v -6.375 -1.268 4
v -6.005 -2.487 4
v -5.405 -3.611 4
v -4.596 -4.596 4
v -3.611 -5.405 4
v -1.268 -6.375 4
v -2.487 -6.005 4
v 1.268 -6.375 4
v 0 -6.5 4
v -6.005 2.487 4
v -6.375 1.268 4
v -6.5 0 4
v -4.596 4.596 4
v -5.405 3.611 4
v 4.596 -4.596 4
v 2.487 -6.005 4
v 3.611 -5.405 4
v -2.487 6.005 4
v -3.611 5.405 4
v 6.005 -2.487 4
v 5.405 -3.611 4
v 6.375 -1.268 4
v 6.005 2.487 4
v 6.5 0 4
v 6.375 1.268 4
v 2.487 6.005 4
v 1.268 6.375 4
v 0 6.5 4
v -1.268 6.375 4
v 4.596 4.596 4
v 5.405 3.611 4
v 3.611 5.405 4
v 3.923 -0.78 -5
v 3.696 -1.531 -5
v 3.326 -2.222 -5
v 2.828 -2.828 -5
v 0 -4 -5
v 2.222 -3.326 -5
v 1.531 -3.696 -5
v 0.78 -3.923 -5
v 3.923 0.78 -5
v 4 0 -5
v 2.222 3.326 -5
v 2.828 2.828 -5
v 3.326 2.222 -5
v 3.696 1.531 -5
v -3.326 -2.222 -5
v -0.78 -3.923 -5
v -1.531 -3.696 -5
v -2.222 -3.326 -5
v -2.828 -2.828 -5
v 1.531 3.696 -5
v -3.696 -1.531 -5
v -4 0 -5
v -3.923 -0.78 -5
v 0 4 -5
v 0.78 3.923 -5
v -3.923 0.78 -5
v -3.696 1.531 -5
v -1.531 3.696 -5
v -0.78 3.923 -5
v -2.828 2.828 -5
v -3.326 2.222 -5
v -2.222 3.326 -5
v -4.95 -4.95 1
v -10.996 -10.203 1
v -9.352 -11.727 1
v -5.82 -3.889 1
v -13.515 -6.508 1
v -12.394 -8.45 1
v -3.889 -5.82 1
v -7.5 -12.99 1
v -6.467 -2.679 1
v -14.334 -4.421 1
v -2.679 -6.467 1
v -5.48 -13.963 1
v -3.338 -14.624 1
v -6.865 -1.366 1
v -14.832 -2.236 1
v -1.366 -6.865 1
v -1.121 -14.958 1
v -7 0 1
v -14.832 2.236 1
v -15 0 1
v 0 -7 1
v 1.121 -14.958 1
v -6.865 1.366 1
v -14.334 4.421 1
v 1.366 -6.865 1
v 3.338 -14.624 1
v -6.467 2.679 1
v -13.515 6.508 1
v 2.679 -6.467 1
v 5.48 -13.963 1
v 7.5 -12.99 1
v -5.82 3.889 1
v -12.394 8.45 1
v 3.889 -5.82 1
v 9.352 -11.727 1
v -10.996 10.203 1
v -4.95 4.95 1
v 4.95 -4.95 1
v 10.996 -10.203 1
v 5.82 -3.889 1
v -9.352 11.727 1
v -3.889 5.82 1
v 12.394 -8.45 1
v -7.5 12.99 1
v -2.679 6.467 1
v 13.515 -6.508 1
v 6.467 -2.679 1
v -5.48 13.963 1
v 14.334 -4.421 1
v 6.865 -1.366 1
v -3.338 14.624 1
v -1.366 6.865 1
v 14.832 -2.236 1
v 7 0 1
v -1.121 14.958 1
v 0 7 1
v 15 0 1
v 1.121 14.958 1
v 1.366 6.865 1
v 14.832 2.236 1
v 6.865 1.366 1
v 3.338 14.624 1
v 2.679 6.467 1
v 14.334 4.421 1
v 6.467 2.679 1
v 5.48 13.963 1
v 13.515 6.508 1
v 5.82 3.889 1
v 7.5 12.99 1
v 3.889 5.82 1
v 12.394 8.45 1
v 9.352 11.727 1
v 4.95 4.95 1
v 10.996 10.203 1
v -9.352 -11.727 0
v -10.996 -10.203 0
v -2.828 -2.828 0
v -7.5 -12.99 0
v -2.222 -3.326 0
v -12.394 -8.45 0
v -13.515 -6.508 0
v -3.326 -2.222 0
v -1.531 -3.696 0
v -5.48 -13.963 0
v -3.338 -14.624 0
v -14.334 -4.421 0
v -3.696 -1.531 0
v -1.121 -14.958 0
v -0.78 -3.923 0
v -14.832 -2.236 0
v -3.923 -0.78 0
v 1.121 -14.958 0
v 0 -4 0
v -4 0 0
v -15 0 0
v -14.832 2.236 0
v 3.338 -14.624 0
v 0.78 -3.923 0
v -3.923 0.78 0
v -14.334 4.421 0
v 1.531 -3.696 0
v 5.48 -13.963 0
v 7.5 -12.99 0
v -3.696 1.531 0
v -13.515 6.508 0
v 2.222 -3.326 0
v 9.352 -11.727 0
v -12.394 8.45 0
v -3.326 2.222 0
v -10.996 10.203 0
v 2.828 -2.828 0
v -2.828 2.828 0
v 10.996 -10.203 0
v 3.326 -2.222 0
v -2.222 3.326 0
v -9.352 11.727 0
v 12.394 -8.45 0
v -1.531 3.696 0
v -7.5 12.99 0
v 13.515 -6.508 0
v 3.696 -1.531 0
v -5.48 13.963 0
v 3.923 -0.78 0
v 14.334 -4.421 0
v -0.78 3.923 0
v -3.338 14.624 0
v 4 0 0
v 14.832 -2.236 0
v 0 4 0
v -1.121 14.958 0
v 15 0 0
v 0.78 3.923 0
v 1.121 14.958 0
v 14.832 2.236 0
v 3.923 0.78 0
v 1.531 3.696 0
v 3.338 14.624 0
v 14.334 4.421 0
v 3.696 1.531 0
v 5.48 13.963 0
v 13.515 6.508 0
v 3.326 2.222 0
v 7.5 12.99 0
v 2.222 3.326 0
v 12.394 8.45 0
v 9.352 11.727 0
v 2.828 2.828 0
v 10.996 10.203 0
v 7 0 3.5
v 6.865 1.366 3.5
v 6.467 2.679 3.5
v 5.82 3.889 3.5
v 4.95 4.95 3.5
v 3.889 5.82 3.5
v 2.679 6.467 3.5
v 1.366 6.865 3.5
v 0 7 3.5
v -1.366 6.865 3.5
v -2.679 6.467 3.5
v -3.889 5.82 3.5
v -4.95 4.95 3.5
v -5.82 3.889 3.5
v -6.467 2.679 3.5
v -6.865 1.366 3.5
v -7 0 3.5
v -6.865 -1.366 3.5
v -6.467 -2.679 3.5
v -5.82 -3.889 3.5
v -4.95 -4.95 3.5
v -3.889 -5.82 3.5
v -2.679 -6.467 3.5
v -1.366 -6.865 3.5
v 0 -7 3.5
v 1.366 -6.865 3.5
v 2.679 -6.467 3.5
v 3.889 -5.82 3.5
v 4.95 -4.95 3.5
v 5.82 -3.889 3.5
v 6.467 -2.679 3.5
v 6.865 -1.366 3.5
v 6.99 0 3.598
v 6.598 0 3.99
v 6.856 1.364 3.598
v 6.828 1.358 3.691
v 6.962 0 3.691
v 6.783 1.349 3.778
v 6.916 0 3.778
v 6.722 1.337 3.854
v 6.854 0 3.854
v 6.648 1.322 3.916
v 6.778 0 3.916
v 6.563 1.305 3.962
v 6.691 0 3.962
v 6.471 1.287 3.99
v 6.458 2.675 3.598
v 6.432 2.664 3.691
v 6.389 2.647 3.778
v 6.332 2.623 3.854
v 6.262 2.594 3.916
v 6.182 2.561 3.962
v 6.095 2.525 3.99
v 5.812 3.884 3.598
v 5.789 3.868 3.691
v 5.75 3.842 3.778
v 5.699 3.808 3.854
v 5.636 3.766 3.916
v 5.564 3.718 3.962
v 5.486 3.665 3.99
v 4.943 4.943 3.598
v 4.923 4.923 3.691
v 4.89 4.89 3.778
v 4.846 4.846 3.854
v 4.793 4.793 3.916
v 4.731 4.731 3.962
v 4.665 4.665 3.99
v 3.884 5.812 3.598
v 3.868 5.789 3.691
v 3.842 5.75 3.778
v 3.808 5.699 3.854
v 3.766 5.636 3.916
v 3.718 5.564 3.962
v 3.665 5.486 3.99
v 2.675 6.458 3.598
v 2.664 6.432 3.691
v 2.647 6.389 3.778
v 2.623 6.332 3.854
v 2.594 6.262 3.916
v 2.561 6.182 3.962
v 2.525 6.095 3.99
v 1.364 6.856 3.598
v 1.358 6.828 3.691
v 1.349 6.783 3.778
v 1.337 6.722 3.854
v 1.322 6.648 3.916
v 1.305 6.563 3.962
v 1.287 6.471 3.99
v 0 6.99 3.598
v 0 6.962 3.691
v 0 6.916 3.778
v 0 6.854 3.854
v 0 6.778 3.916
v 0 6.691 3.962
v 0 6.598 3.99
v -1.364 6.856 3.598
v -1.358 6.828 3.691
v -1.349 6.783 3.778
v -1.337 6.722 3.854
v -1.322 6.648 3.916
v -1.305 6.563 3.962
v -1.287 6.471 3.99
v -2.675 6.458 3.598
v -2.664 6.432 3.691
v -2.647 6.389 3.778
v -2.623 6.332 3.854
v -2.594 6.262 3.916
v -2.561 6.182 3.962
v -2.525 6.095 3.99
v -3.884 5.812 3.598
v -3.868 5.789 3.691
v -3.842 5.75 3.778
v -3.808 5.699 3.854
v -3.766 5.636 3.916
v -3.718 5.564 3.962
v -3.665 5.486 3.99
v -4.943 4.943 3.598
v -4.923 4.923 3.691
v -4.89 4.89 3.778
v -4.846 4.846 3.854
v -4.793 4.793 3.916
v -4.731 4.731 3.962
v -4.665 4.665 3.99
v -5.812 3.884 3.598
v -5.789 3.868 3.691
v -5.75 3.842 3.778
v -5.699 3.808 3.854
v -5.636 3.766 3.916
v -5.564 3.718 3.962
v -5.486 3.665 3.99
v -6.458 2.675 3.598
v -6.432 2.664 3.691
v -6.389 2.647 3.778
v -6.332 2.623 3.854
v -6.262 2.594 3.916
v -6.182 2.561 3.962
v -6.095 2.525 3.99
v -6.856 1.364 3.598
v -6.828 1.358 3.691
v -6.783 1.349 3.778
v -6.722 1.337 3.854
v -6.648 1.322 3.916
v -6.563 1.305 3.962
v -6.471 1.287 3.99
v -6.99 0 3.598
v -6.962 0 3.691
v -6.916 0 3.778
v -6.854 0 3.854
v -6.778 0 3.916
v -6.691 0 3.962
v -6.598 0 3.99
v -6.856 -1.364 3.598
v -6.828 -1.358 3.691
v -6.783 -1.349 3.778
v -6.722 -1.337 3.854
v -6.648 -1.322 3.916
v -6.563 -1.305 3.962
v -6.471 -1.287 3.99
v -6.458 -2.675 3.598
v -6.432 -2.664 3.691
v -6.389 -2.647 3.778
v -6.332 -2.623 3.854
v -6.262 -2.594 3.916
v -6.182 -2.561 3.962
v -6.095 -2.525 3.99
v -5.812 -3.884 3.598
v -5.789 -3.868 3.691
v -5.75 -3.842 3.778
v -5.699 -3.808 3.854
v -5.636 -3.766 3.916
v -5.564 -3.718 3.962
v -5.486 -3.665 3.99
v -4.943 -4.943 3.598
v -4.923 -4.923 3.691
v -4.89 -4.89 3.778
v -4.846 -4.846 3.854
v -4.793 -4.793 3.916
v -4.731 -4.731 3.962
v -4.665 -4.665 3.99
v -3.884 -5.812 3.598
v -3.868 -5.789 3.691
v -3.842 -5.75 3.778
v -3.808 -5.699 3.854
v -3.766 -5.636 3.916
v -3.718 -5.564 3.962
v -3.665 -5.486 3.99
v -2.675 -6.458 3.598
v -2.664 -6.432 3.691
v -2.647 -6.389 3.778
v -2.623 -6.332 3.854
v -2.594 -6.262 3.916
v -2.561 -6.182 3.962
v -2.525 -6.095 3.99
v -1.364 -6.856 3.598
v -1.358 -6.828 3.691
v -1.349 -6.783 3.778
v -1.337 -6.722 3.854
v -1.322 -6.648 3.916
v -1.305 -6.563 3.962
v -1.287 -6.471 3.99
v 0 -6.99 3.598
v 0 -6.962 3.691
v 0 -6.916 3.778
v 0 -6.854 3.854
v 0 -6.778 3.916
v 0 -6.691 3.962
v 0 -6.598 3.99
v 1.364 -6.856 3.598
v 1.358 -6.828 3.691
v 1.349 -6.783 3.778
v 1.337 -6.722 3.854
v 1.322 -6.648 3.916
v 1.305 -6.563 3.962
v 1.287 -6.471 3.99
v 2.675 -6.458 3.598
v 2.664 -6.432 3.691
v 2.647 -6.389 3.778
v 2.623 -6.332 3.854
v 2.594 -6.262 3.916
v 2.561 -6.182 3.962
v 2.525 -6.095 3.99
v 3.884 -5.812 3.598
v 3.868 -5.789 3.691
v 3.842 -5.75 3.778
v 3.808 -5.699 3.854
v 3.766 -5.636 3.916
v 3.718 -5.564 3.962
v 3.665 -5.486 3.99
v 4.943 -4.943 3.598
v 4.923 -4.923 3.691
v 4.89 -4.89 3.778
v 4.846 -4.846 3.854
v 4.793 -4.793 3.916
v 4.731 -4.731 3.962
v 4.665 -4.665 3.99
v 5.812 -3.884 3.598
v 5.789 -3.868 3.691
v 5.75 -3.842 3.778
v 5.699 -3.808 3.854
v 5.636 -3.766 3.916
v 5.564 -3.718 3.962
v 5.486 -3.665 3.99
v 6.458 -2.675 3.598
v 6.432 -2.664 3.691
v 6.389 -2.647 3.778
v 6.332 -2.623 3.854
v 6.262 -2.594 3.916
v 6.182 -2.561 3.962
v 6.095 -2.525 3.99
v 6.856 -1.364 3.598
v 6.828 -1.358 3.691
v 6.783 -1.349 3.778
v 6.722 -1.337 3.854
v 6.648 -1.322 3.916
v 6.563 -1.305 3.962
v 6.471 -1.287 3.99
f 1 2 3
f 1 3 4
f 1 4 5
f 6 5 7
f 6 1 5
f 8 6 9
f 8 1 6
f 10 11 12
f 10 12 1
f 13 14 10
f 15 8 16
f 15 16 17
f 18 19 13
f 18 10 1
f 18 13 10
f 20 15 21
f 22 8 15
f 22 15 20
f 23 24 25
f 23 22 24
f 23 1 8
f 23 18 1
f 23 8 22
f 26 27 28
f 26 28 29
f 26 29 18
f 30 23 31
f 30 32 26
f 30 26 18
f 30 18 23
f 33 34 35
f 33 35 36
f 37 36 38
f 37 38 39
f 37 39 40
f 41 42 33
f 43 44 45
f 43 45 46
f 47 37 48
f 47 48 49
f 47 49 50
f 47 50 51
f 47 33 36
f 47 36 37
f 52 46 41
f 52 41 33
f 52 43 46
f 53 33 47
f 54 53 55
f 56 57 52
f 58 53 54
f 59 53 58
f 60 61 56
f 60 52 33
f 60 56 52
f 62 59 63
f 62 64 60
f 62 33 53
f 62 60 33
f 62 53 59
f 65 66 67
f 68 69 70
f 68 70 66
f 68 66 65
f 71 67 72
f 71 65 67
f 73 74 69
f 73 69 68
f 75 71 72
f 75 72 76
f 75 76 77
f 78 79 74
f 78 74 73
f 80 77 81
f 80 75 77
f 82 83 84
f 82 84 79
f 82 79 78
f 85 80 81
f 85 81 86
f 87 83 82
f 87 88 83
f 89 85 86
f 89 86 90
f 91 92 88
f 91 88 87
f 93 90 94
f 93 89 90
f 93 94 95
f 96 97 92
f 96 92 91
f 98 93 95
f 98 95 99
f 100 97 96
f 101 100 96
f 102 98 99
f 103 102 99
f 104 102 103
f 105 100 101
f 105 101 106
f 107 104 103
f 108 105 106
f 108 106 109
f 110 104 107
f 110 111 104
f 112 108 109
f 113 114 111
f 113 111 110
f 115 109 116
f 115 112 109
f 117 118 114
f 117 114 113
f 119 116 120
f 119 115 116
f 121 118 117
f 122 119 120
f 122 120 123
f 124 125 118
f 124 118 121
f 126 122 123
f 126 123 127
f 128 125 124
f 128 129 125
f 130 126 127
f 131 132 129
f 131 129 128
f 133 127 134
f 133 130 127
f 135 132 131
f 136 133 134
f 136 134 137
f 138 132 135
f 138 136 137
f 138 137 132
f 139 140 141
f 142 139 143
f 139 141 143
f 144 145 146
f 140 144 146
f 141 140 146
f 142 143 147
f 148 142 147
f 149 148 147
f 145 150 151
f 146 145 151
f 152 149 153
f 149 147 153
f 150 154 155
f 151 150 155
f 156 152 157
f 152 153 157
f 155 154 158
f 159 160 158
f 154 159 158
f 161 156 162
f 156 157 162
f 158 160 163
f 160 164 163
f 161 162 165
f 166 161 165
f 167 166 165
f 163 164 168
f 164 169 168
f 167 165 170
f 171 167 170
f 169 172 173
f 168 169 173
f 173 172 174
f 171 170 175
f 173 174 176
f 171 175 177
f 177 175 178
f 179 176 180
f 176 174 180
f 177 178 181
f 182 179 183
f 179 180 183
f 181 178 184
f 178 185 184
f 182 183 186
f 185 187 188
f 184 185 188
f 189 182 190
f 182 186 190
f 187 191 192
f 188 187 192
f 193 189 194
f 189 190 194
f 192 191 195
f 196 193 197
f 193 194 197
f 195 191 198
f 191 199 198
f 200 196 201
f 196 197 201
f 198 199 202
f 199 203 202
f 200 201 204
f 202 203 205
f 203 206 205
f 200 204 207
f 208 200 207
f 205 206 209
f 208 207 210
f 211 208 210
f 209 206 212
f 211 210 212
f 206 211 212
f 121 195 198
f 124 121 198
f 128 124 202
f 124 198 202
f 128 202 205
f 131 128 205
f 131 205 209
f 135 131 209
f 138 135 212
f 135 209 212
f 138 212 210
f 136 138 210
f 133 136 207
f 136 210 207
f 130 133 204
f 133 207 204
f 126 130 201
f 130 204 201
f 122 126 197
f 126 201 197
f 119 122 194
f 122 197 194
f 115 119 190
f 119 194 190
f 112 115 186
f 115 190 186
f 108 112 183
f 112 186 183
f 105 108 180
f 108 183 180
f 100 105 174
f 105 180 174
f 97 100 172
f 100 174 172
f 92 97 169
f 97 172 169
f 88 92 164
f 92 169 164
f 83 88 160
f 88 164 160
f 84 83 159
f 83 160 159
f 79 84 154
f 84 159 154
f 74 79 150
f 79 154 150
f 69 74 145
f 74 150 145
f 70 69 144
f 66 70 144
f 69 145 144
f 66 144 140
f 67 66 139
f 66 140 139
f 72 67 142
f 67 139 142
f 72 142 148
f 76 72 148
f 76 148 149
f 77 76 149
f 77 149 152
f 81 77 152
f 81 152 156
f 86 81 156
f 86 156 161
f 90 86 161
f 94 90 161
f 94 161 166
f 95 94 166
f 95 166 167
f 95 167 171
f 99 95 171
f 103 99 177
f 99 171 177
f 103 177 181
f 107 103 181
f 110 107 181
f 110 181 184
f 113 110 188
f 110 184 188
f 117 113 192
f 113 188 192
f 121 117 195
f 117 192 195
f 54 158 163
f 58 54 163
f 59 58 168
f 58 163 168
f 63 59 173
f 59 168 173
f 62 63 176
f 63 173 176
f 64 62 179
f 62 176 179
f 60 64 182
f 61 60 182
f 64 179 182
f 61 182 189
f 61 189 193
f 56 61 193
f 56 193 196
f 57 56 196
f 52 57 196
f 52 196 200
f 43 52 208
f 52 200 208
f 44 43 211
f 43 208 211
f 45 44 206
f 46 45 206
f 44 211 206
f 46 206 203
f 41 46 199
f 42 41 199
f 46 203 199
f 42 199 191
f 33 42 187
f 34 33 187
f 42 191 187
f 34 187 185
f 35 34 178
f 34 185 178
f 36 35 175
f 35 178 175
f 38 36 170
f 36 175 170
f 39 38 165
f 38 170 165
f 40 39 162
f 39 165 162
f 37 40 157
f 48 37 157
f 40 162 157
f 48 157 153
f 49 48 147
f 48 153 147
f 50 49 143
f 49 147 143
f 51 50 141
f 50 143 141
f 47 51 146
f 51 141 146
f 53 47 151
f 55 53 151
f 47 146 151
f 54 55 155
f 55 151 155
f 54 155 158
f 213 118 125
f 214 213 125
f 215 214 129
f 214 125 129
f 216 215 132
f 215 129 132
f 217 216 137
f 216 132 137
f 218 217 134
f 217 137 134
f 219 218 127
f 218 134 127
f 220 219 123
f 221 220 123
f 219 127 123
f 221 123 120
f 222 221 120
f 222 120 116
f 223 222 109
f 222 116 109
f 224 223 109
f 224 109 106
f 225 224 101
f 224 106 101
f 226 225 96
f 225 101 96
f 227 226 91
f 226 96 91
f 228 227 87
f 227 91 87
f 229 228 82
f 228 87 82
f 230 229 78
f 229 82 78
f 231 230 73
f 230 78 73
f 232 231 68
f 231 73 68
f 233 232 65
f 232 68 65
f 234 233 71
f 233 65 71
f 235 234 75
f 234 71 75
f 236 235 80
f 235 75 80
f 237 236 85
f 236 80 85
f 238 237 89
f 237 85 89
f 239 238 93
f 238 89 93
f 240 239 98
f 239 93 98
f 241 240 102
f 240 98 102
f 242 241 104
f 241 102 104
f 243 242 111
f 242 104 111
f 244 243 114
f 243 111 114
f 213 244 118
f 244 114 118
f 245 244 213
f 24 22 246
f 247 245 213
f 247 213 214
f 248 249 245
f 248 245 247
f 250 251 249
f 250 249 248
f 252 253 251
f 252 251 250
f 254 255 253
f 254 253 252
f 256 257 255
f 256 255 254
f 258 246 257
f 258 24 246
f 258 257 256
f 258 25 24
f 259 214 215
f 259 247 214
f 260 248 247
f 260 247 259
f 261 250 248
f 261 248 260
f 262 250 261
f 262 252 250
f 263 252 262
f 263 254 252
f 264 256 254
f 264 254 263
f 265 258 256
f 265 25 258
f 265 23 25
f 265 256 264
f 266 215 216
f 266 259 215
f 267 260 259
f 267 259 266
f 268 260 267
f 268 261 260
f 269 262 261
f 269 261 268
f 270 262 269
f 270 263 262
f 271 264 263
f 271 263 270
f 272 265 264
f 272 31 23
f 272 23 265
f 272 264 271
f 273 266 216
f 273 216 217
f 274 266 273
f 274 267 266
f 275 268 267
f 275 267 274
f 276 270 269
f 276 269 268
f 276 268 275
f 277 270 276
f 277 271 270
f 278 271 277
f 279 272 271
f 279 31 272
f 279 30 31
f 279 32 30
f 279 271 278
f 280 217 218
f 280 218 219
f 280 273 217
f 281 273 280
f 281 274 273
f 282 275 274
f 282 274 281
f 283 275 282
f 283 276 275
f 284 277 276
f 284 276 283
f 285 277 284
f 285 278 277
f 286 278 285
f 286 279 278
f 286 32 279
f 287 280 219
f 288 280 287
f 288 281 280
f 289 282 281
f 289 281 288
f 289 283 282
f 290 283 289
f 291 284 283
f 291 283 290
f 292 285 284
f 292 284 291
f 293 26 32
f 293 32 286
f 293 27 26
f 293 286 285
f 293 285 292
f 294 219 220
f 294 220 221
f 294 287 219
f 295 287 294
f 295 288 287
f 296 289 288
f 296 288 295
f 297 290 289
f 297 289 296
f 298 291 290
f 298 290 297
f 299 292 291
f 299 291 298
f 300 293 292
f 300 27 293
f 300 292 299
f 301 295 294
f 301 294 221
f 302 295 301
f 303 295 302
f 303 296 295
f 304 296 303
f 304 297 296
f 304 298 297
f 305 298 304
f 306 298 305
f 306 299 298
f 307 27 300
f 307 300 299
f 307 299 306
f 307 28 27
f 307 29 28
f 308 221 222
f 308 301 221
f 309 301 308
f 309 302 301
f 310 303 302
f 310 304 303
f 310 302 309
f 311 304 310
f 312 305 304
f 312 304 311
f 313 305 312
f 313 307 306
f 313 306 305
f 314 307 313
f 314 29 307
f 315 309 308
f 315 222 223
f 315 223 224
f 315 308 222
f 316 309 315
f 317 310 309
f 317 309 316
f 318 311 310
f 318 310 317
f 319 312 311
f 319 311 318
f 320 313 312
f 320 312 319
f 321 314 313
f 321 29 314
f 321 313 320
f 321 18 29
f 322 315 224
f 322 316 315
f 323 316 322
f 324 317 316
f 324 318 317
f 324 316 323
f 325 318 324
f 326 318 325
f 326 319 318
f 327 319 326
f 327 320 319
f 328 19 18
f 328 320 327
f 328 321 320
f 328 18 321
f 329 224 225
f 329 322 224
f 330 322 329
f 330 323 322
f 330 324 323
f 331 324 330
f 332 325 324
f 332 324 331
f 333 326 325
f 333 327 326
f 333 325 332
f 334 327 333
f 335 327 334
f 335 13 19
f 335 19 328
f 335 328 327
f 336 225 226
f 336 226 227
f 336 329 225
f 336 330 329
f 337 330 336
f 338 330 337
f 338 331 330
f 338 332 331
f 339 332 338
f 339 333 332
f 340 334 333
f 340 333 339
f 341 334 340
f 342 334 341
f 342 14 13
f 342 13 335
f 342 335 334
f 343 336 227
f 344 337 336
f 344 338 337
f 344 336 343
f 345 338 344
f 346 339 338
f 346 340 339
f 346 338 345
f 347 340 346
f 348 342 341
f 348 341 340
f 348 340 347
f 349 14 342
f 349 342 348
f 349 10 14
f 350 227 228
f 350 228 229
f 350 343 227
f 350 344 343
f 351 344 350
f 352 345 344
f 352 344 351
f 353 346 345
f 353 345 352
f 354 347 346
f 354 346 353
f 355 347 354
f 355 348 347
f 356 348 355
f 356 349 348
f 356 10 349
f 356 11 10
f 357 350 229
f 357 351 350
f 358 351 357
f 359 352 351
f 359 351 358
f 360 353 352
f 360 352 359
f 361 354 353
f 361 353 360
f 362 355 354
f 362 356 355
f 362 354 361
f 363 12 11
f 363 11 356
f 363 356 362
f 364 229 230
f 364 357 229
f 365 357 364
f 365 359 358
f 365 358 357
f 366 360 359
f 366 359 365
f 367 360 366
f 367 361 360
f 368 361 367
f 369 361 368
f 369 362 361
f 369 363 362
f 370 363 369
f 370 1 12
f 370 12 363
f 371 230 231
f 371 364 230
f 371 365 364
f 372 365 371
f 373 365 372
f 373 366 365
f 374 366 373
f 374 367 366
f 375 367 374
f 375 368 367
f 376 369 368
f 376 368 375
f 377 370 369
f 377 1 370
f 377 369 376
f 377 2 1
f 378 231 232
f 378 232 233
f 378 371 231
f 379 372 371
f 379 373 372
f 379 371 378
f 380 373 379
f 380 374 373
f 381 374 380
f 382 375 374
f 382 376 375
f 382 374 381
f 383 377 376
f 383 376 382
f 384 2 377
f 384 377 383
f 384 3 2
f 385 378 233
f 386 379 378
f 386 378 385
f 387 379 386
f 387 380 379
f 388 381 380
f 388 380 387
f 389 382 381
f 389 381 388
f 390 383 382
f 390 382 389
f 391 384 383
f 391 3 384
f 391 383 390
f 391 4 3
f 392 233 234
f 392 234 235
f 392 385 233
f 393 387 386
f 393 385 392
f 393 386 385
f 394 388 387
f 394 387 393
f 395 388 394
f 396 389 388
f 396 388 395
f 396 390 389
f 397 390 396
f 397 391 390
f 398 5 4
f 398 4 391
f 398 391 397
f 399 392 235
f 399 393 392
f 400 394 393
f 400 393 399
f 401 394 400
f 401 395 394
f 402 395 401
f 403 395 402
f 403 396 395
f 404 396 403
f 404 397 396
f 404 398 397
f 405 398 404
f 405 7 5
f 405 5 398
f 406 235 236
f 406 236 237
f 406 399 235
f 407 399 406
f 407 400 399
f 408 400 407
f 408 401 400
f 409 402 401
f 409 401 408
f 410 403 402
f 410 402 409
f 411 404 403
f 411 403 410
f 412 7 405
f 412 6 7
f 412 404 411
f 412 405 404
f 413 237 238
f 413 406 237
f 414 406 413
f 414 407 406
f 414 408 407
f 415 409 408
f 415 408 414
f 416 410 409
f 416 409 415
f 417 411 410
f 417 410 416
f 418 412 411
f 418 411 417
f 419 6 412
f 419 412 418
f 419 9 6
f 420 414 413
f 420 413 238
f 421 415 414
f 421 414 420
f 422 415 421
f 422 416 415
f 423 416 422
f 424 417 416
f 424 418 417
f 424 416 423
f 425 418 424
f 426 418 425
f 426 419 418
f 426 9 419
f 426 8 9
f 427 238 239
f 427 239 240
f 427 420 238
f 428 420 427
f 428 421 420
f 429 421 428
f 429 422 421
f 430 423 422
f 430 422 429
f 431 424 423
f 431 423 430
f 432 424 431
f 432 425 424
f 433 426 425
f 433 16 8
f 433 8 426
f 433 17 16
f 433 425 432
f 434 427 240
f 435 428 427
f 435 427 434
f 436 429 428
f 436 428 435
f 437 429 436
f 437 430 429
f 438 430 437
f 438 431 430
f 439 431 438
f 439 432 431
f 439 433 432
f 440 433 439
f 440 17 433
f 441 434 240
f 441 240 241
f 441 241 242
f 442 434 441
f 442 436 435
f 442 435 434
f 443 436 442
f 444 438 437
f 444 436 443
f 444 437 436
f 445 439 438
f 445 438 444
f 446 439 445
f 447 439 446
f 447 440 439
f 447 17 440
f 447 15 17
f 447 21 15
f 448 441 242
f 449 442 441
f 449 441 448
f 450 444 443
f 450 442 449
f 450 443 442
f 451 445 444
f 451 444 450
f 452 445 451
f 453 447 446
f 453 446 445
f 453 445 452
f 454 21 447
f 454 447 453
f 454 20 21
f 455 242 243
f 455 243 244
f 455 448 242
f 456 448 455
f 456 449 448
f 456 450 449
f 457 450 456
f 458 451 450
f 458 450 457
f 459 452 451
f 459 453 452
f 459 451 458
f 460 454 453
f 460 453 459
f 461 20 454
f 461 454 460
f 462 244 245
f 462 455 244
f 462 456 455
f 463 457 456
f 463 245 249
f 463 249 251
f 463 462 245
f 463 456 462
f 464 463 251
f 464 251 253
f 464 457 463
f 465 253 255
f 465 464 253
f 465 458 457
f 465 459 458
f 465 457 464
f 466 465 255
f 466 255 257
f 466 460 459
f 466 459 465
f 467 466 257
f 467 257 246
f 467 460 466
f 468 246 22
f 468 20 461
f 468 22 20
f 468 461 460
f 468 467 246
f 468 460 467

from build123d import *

# Parameters (mm, degrees)
ESQUISSE1_R        = 15
BOSS_EXTRU_1_DEPTH = 1
ESQUISSE2_R        = 7
BOSS_EXTRU_2_DEPTH = 3
CONG_1_R           = 0.5
ESQUISSE3_R        = 4
BOSS_EXTRU_3_DEPTH = 5


with BuildPart() as part:
    # Esquisse1 → Boss.-Extru.1 (new body)
    with BuildSketch(Plane.XY):
        Circle(ESQUISSE1_R)
    extrude(amount=BOSS_EXTRU_1_DEPTH)

    # Esquisse2 → Boss.-Extru.2 (add)
    with BuildSketch(Plane.XY.offset(1)):
        Circle(ESQUISSE2_R)
    extrude(amount=BOSS_EXTRU_2_DEPTH)

    # Congé1
    cong_1_edges = [part.edges().sort_by_distance(p)[0] for p in [
        (-7, 0, 4),
    ]]
    fillet(cong_1_edges, radius=CONG_1_R)

    # Esquisse3 → Boss.-Extru.3 (add)
    with BuildSketch(Plane(origin=(0, 0, 0), x_dir=(-1, 0, 0), z_dir=(0, 0, -1))):
        Circle(ESQUISSE3_R)
    extrude(amount=BOSS_EXTRU_3_DEPTH)


solid = part.part
